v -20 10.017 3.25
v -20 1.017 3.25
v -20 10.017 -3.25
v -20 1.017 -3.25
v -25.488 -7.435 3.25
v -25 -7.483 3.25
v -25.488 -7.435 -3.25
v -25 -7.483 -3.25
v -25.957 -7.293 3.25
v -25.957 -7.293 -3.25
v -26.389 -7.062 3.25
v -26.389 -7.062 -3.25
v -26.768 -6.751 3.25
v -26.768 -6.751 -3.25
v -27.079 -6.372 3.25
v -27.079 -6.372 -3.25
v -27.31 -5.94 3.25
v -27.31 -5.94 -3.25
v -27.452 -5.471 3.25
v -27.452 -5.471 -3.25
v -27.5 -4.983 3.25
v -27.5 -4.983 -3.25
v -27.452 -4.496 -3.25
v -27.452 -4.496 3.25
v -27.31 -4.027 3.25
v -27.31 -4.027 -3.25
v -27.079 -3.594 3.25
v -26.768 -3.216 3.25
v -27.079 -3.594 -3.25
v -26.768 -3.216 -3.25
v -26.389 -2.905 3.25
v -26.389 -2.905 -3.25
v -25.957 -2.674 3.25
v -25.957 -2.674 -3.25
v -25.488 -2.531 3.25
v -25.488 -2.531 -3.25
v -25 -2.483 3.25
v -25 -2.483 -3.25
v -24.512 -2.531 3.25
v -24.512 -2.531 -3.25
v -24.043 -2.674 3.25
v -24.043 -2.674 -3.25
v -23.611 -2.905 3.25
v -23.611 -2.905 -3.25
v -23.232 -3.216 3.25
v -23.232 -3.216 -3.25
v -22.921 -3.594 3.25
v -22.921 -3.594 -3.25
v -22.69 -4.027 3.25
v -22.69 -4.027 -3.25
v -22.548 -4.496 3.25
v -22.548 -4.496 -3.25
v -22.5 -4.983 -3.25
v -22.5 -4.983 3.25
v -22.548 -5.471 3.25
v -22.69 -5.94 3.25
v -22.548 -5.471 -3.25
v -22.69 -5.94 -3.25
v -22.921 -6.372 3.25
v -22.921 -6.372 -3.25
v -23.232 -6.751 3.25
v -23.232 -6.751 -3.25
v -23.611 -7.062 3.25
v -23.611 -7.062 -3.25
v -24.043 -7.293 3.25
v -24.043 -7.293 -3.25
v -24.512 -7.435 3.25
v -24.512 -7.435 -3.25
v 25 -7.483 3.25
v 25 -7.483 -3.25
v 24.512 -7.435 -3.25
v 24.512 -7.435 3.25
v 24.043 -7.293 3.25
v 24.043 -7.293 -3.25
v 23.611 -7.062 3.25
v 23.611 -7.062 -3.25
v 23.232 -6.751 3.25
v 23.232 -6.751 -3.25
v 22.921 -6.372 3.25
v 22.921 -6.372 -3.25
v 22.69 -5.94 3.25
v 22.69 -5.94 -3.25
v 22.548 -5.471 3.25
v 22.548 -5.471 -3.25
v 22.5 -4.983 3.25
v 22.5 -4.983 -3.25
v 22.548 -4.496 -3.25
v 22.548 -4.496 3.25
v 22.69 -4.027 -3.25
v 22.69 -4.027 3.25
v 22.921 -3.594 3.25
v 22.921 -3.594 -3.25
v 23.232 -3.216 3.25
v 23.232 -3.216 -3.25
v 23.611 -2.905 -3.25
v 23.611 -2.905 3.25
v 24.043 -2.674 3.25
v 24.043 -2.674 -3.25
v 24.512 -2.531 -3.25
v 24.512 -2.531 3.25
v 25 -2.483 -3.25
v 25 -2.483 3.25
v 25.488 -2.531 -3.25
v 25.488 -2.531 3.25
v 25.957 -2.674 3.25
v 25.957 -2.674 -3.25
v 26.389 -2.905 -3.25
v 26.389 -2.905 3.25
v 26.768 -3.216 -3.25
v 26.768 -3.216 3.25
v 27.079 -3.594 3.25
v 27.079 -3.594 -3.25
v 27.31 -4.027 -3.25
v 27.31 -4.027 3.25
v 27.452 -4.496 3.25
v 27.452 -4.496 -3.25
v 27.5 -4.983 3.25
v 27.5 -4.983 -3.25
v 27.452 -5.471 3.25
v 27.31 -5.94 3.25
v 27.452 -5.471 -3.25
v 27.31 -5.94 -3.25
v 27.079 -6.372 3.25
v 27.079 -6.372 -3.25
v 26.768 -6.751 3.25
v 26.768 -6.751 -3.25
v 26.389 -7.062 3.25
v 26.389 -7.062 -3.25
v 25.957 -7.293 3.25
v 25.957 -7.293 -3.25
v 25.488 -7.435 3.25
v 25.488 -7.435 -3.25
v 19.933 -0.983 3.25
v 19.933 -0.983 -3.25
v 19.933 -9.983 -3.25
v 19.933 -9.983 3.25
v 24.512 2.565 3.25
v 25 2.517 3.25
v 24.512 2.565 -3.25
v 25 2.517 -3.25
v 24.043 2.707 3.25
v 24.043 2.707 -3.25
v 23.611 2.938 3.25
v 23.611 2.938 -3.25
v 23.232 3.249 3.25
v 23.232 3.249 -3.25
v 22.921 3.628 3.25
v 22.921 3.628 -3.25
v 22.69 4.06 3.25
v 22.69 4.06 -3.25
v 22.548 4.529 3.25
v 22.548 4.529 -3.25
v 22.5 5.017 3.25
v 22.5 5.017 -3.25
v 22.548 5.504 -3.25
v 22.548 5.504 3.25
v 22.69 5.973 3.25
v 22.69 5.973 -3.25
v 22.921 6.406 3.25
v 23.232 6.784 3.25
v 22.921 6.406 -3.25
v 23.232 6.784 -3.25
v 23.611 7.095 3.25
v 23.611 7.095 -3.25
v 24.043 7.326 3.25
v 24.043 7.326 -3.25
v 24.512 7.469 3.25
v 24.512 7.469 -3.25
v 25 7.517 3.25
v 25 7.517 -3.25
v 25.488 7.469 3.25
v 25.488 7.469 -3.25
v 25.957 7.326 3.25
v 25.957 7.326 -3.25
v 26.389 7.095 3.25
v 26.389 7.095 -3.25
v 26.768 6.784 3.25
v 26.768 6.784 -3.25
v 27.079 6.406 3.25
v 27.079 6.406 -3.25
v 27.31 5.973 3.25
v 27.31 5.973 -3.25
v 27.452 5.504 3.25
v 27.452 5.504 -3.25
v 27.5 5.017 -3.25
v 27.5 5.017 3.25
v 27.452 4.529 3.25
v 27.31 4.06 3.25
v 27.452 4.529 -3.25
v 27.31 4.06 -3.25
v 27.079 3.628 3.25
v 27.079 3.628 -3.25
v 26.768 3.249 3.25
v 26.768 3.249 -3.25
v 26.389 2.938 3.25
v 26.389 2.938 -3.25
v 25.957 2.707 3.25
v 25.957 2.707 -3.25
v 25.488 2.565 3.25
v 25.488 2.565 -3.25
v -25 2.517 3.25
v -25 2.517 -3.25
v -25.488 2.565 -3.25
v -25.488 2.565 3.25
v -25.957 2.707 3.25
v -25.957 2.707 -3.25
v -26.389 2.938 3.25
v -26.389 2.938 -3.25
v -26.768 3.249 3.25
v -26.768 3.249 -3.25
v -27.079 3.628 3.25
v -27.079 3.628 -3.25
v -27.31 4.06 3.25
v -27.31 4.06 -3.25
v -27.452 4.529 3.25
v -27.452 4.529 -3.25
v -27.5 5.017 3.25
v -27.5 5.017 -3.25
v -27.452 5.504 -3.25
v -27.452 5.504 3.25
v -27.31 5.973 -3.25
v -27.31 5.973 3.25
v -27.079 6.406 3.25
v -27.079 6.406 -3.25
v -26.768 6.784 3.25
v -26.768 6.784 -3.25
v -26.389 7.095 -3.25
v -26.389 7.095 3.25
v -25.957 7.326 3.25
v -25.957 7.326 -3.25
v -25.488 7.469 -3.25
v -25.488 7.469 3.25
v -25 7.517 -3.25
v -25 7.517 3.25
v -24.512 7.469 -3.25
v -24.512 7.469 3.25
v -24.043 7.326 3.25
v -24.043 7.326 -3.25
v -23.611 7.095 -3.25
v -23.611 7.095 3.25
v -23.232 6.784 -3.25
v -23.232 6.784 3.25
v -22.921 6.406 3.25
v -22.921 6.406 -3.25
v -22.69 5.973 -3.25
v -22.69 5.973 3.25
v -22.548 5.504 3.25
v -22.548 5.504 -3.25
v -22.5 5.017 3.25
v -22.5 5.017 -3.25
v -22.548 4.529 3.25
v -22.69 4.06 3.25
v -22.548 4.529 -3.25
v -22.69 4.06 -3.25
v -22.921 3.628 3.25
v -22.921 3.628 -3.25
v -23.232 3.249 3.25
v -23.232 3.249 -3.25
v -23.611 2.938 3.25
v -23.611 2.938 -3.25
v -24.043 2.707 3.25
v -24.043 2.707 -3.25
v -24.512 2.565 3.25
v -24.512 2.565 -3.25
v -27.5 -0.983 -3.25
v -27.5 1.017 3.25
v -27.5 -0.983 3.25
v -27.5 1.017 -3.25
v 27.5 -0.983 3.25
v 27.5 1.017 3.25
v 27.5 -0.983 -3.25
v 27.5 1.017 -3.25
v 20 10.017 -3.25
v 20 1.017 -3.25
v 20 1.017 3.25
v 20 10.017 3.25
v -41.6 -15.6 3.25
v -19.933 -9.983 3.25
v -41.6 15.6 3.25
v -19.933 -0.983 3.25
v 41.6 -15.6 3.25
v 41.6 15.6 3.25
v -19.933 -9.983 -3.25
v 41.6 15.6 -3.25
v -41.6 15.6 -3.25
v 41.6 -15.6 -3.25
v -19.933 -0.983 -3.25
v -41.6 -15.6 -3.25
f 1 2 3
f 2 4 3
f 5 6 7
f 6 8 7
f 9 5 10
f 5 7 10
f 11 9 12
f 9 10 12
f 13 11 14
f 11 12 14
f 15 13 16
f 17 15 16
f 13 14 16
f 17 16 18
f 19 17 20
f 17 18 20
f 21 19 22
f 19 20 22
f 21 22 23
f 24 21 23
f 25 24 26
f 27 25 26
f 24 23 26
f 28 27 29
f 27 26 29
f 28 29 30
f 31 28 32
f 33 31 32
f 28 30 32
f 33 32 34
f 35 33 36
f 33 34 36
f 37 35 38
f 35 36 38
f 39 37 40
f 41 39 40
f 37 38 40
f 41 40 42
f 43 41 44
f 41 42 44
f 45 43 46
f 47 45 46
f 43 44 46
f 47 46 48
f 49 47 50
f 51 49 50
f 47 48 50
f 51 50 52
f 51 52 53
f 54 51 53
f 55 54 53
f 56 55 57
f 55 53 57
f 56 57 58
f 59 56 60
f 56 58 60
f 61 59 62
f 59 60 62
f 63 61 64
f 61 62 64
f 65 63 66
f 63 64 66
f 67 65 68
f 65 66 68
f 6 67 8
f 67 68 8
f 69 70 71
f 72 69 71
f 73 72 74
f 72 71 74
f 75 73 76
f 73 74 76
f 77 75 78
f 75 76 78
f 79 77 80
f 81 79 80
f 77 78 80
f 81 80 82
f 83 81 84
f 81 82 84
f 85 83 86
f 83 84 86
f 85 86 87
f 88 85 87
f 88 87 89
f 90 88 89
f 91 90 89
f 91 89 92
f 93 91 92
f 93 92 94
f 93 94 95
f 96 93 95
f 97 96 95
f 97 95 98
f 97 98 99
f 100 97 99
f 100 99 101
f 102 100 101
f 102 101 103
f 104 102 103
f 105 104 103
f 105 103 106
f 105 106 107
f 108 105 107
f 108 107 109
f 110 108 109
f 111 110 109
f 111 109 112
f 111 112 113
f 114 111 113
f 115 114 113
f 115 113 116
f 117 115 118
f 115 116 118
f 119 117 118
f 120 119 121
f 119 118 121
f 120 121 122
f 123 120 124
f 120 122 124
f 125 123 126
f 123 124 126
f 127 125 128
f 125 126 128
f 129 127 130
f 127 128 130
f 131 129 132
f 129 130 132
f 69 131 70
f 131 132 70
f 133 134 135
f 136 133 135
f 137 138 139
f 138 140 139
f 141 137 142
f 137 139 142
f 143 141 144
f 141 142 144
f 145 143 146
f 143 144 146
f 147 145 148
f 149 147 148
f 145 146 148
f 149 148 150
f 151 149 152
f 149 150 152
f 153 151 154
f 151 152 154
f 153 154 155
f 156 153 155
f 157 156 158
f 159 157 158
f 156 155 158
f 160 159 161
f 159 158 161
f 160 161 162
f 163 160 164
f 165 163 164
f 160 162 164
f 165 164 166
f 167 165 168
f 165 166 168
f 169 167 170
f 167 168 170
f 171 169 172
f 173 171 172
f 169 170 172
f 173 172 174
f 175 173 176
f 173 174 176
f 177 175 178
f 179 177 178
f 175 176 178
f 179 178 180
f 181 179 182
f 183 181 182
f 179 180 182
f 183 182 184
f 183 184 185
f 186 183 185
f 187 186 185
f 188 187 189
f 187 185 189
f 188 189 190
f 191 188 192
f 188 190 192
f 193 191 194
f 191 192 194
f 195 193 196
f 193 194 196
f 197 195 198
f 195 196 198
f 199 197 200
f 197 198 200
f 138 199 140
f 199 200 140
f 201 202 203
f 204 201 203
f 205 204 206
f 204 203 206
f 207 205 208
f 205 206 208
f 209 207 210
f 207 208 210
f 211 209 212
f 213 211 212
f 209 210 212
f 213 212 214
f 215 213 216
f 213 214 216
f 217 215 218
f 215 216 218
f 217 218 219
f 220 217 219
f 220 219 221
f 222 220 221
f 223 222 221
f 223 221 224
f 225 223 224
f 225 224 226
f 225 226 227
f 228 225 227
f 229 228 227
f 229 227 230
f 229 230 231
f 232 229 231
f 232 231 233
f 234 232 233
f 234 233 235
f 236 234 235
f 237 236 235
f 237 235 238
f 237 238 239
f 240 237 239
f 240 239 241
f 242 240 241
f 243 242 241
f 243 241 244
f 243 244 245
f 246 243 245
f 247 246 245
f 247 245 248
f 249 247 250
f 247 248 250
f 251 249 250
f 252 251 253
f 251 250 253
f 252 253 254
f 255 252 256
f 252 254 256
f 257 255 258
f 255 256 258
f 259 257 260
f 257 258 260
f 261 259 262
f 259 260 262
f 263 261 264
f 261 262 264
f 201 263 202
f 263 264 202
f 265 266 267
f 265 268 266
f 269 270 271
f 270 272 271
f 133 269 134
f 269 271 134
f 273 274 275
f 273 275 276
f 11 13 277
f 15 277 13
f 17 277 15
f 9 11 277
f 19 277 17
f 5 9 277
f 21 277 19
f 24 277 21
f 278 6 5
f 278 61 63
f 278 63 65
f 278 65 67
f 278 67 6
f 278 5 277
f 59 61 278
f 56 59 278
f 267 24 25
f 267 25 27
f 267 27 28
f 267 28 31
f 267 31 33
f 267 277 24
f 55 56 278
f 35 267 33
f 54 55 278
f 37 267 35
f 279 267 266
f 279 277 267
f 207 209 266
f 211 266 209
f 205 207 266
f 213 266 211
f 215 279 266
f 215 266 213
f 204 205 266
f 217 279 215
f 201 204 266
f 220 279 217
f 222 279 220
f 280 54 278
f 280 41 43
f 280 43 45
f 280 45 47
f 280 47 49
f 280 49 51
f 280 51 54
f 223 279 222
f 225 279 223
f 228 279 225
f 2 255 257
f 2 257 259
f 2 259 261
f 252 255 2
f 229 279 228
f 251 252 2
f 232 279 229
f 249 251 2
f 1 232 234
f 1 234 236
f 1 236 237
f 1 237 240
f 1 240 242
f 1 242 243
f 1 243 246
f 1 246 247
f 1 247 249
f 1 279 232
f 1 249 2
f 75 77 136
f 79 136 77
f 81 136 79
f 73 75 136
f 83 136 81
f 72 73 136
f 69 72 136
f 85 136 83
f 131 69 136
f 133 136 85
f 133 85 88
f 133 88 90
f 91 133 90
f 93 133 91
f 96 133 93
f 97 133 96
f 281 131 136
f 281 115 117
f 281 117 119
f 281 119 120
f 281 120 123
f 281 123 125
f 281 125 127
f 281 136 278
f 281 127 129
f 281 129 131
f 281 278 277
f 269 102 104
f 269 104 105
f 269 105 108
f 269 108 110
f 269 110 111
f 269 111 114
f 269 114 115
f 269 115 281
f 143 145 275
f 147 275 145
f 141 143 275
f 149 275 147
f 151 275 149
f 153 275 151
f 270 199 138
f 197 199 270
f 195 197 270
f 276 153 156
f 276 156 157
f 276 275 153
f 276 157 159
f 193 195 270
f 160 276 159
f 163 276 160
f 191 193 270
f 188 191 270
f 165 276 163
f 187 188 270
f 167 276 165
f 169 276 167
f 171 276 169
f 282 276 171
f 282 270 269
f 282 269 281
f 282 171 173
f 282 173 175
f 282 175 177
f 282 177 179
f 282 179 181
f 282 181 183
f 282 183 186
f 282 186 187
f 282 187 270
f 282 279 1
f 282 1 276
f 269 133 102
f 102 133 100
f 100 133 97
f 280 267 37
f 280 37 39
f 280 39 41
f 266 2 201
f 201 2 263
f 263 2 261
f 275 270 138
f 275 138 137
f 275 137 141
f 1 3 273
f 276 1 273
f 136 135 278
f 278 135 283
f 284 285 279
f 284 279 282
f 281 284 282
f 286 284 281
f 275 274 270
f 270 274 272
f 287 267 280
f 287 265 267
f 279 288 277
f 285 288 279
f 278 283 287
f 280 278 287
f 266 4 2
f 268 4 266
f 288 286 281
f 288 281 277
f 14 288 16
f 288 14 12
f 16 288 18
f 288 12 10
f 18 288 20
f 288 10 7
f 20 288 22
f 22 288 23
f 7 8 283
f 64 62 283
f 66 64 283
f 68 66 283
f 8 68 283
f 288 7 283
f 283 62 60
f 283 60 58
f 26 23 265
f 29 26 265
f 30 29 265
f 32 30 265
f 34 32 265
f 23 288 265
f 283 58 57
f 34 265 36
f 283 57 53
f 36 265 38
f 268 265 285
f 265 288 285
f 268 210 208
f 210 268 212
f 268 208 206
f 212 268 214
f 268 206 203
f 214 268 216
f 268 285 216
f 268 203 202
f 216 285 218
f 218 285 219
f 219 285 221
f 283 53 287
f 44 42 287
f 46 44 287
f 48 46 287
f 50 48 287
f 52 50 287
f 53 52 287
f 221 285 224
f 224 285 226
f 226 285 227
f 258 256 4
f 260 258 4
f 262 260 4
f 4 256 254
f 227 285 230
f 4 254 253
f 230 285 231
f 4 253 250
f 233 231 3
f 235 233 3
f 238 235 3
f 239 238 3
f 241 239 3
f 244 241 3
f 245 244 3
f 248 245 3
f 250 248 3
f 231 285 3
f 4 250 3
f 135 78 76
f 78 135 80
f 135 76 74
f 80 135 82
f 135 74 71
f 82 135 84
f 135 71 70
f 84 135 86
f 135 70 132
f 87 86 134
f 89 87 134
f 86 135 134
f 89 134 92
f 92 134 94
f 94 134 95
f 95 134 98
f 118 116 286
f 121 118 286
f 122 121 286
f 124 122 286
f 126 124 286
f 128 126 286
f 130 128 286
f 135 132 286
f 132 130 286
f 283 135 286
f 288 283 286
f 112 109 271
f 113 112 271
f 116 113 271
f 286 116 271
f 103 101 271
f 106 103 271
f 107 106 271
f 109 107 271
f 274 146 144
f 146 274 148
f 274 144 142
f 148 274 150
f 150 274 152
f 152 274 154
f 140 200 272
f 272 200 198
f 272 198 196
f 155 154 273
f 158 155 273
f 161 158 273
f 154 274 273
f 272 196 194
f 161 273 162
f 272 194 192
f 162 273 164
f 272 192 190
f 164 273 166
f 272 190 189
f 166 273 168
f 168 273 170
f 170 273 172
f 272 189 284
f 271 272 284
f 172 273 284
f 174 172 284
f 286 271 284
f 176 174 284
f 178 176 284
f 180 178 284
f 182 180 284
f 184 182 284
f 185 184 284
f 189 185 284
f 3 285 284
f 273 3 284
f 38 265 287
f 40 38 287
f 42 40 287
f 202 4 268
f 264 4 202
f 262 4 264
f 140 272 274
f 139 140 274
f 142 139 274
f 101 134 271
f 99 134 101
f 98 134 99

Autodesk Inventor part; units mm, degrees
ref_plane "YZ Plane" through (0, 0, 0) normal (1, 0, 0) x (0, 1, 0)
ref_plane "XZ Plane" through (0, 0, 0) normal (0, 1, 0) x (-1, 0, 0)
ref_plane "XY Plane" through (0, 0, 0) normal (0, 0, 1) x (1, 0, 0)
sketch "Sketch1" plane through (0, 0, 0) normal (0, 0, 1) x (1, 0, 0)
  line L0 (-20, 10.0166) -> (20, 10.0166)
  line L1 (19.9334, -9.9833) -> (-19.9334, -9.9833)
  line L2 (-20, 10.0166) -> (19.9334, -9.9833) construction
  line L3 (20, 10.0166) -> (-19.9334, -9.9833) construction
  line L4 (-41.6, 15.6) -> (41.6, 15.6)
  line L5 (41.6, 15.6) -> (41.6, -15.6)
  line L6 (41.6, -15.6) -> (-41.6, -15.6)
  line L7 (-41.6, -15.6) -> (-41.6, 15.6)
  line L8 (-41.6, 15.6) -> (41.6, -15.6) construction
  line L9 (41.6, 15.6) -> (-41.6, -15.6) construction
  line L10 (-20, 1.0167) -> (-27.5, 1.0167)
  line L11 (-27.5, 1.0167) -> (-27.5, -0.9833)
  line L12 (-27.5, -0.9833) -> (-19.9334, -0.9833)
  line L13 (20, 1.0167) -> (27.5, 1.0167)
  line L14 (27.5, 1.0167) -> (27.5, -0.9833)
  line L15 (27.5, -0.9833) -> (19.9334, -0.9833)
  line L16 (-20, 1.0167) -> (-20, 10.0166)
  line L17 (-19.9334, -9.9833) -> (-19.9334, -0.9833)
  line L18 (19.9334, -0.9833) -> (19.9334, -9.9833)
  line L19 (20, 1.0167) -> (20, 10.0166)
  point P0 (0, 0)
  point P1 (-27.5, 0.0167)
  point P2 (-0.0333, 0.0167)
  point P3 (0, 10.0166)
  point P4 (0, 0)
  dimension "CInt" = 40
  dimension "LInt" = 20
  dimension "Cext" = 83.2
  dimension "Lext" = 31.2
  dimension "Cpeq" = 7.5
  dimension "Lpeq" = 2
  dimension "d10" = 7.5
  dimension "d11" = 2
extrude "Extrusion1" add sketch "Sketch1" along normal mid plane 6.5
sketch "Sketch8" plane through (0, 0, 3.25) normal (0, 0, 1) x (1, 0, 0)
  point P0 (0, 0)
hole "Hole1" at (-25, 5.0167, 3.25) direction (0, 0, -1) diameter 5 end through all
pattern_linear "Rectangular Pattern1" count 2 spacing 10 along (0, -1, 0) of "Hole1"
hole "Hole2" at (25, 5.0167, 3.25) direction (0, 0, -1) diameter 5 end through all
pattern_linear "Rectangular Pattern2" count 2 spacing 10 along (0, -1, 0) of "Hole2"
properties part number "Cou-Bon"
